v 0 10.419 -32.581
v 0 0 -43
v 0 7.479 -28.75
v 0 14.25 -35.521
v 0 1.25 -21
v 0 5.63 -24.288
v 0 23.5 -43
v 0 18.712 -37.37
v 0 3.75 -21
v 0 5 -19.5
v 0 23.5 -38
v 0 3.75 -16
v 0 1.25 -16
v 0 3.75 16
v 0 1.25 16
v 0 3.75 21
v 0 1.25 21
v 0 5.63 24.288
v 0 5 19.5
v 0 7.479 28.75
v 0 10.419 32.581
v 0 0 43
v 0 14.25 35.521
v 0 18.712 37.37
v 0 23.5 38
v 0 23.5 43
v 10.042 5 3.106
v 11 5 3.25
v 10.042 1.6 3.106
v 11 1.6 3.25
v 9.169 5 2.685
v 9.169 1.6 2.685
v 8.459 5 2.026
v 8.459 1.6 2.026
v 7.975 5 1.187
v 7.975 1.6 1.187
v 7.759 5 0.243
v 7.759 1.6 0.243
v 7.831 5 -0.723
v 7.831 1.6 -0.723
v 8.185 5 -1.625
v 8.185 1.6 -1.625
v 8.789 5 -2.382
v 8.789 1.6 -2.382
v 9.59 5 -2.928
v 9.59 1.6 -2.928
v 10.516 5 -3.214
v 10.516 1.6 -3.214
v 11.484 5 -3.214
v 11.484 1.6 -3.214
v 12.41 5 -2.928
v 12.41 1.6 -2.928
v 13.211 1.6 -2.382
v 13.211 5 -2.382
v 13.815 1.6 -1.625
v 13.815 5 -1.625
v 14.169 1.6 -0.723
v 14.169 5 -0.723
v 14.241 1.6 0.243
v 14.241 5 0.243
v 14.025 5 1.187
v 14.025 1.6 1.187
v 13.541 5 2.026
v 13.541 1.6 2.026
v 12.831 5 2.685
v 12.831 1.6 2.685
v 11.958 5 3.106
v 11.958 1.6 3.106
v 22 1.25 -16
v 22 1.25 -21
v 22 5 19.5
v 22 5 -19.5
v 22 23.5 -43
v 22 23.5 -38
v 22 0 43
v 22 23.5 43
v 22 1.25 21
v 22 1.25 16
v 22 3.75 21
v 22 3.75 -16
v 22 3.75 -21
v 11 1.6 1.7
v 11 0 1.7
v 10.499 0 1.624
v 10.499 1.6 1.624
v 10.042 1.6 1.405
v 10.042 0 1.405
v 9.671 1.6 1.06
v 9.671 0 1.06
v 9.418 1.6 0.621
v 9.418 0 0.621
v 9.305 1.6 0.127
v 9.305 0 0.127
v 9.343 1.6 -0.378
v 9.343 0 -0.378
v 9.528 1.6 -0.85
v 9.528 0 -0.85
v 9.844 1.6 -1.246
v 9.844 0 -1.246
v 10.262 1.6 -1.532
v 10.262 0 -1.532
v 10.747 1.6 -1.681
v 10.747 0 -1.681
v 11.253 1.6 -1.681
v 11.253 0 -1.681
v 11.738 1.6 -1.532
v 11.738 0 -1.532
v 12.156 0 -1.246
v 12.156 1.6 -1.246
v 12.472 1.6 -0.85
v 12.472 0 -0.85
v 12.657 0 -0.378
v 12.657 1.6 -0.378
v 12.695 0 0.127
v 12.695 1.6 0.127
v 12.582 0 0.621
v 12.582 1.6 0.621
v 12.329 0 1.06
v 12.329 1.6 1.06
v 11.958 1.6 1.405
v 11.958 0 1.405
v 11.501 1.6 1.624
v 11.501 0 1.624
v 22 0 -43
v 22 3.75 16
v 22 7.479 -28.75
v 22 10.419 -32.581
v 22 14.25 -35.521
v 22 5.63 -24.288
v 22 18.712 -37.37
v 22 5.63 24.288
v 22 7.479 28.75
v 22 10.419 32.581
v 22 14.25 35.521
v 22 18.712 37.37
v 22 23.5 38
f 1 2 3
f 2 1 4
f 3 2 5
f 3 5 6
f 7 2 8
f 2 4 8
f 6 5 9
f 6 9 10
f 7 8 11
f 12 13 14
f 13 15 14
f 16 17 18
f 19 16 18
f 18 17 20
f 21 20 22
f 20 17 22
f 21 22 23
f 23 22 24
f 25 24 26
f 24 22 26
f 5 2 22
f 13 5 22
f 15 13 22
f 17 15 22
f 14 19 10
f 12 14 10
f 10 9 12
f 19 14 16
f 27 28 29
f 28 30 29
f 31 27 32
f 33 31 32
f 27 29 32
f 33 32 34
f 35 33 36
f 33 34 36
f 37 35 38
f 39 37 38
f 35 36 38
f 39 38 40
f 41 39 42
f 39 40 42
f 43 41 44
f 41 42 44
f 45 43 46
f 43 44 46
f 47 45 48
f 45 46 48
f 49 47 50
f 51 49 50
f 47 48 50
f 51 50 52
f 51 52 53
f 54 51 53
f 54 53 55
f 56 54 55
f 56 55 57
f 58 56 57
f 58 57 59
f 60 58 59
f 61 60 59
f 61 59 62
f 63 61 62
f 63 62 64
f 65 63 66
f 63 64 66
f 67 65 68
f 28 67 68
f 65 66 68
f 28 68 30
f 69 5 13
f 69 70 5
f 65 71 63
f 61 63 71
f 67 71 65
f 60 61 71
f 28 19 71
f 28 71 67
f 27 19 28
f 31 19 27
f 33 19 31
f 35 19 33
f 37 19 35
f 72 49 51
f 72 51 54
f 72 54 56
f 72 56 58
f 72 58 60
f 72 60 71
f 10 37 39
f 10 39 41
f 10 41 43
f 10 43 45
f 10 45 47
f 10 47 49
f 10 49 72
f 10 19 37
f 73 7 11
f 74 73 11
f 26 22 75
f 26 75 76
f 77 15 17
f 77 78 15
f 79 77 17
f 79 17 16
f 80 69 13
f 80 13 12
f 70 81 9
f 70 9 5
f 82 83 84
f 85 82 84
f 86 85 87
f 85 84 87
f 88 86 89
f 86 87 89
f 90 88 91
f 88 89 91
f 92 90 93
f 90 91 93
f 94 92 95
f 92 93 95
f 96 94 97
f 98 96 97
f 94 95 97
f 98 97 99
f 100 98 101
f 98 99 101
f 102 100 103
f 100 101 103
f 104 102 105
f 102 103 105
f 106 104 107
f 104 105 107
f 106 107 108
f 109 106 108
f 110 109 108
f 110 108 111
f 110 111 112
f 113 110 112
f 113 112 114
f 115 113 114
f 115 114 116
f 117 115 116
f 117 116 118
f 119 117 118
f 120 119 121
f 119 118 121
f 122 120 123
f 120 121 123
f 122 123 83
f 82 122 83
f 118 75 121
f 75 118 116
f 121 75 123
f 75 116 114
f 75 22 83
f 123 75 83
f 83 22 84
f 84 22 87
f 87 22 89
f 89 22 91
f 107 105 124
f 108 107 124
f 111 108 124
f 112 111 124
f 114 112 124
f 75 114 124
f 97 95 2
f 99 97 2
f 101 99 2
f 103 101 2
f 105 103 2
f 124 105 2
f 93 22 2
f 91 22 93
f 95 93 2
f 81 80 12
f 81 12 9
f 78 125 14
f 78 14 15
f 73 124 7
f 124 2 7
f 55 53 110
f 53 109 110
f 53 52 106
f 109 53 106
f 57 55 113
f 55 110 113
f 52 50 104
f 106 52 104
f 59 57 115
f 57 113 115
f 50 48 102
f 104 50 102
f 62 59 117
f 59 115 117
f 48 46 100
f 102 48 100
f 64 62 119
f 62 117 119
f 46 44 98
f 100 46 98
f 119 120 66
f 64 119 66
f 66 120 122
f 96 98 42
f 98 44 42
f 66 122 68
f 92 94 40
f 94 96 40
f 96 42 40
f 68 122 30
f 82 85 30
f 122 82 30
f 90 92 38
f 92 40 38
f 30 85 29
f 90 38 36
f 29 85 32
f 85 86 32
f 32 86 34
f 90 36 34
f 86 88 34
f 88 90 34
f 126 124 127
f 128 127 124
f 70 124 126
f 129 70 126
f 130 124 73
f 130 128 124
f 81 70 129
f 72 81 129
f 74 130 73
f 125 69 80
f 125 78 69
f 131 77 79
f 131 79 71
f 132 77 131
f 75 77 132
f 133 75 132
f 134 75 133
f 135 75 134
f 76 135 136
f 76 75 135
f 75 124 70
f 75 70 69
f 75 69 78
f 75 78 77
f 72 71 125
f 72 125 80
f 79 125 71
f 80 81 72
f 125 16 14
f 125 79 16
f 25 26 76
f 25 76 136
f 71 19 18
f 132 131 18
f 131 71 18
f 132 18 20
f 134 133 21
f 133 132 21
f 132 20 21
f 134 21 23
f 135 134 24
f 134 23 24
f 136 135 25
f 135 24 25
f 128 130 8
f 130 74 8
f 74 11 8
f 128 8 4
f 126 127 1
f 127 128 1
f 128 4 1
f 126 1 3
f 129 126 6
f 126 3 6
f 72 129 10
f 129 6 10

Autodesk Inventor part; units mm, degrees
ref_plane "YZ Plane" through (0, 0, 0) normal (1, 0, 0) x (0, 1, 0)
ref_plane "XZ Plane" through (0, 0, 0) normal (0, 1, 0) x (-1, 0, 0)
ref_plane "XY Plane" through (0, 0, 0) normal (0, 0, 1) x (1, 0, 0)
sketch "Sketch2" plane through (0, 0, 0) normal (1, 0, 0) x (0, 1, 0)
  line L0 (0, 43) -> (0, -43)
  line L1 (0, -43) -> (23.5, -43)
  line L2 (23.5, -43) -> (23.5, -38)
  arc A0 (5, -19.5) -> (23.5, -38) centre (23.5, -19.5) ccw
  line L3 (0, 43) -> (23.5, 43)
  line L4 (23.5, 43) -> (23.5, 38)
  arc A1 (23.5, 38) -> (5, 19.5) centre (23.5, 19.5) ccw
  line L5 (5, 19.5) -> (5, -19.5)
  point P0 (0, 0)
  point P1 (0, 0)
  point P2 (5, 0)
  dimension "d0" = 18.5
  dimension "d1" = 39
  dimension "d2" = 5
  dimension "d3" = 5
extrude "Extrusion1" add sketch "Sketch2" along normal blind 22
sketch "Sketch3" plane through (0, 5, 19.5) normal (0, 1, 0) x (1, 0, 0)
  line L0 (0, 39) -> (0, 0) projected
  line L1 (0, -23.5) -> (22, -23.5) projected
  point P0 (0, 19.5)
  point P1 (11, 19.5)
  point P2 (0, 19.5)
  point P3 (11, -23.5)
hole "Hole1" at (11, 5, 0) direction (0, -1, 0) diameter 3.4 end through all counterbore diameter 6.5 counterbore depth 3.4 clearance for "Socket Head Cap Screw DIN EN ISO 4762" size "M3" standard "DIN"
sketch "Sketch4" plane through (22, 0, 0) normal (1, 0, 0) x (0, 0, -1)
  line L0 (-21, 3.75) -> (-16, 3.75)
  line L1 (-16, 3.75) -> (-16, 1.25)
  line L2 (-16, 1.25) -> (-21, 1.25)
  line L3 (-21, 1.25) -> (-21, 3.75)
  line L4 (16, 3.75) -> (21, 3.75)
  line L5 (21, 3.75) -> (21, 1.25)
  line L6 (21, 1.25) -> (16, 1.25)
  line L7 (16, 1.25) -> (16, 3.75)
  line L8 (-16, 3.75) -> (16, 3.75) construction
  line L9 (-43, 0) -> (43, 0) projected
  line L10 (-3.25, 5) -> (3.25, 5) projected
  line L11 (0, 5) -> (0, 0) construction
  point P0 (0, 0)
  point P1 (0, 3.75)
  point P2 (-16, 2.5)
  point P3 (0, 2.5)
  dimension "d13" = 32
  dimension "d14" = 5
  dimension "d15" = 2.5
extrude "Extrusion2" cut sketch "Sketch4" against normal through all
properties part number "CT_Holder"
